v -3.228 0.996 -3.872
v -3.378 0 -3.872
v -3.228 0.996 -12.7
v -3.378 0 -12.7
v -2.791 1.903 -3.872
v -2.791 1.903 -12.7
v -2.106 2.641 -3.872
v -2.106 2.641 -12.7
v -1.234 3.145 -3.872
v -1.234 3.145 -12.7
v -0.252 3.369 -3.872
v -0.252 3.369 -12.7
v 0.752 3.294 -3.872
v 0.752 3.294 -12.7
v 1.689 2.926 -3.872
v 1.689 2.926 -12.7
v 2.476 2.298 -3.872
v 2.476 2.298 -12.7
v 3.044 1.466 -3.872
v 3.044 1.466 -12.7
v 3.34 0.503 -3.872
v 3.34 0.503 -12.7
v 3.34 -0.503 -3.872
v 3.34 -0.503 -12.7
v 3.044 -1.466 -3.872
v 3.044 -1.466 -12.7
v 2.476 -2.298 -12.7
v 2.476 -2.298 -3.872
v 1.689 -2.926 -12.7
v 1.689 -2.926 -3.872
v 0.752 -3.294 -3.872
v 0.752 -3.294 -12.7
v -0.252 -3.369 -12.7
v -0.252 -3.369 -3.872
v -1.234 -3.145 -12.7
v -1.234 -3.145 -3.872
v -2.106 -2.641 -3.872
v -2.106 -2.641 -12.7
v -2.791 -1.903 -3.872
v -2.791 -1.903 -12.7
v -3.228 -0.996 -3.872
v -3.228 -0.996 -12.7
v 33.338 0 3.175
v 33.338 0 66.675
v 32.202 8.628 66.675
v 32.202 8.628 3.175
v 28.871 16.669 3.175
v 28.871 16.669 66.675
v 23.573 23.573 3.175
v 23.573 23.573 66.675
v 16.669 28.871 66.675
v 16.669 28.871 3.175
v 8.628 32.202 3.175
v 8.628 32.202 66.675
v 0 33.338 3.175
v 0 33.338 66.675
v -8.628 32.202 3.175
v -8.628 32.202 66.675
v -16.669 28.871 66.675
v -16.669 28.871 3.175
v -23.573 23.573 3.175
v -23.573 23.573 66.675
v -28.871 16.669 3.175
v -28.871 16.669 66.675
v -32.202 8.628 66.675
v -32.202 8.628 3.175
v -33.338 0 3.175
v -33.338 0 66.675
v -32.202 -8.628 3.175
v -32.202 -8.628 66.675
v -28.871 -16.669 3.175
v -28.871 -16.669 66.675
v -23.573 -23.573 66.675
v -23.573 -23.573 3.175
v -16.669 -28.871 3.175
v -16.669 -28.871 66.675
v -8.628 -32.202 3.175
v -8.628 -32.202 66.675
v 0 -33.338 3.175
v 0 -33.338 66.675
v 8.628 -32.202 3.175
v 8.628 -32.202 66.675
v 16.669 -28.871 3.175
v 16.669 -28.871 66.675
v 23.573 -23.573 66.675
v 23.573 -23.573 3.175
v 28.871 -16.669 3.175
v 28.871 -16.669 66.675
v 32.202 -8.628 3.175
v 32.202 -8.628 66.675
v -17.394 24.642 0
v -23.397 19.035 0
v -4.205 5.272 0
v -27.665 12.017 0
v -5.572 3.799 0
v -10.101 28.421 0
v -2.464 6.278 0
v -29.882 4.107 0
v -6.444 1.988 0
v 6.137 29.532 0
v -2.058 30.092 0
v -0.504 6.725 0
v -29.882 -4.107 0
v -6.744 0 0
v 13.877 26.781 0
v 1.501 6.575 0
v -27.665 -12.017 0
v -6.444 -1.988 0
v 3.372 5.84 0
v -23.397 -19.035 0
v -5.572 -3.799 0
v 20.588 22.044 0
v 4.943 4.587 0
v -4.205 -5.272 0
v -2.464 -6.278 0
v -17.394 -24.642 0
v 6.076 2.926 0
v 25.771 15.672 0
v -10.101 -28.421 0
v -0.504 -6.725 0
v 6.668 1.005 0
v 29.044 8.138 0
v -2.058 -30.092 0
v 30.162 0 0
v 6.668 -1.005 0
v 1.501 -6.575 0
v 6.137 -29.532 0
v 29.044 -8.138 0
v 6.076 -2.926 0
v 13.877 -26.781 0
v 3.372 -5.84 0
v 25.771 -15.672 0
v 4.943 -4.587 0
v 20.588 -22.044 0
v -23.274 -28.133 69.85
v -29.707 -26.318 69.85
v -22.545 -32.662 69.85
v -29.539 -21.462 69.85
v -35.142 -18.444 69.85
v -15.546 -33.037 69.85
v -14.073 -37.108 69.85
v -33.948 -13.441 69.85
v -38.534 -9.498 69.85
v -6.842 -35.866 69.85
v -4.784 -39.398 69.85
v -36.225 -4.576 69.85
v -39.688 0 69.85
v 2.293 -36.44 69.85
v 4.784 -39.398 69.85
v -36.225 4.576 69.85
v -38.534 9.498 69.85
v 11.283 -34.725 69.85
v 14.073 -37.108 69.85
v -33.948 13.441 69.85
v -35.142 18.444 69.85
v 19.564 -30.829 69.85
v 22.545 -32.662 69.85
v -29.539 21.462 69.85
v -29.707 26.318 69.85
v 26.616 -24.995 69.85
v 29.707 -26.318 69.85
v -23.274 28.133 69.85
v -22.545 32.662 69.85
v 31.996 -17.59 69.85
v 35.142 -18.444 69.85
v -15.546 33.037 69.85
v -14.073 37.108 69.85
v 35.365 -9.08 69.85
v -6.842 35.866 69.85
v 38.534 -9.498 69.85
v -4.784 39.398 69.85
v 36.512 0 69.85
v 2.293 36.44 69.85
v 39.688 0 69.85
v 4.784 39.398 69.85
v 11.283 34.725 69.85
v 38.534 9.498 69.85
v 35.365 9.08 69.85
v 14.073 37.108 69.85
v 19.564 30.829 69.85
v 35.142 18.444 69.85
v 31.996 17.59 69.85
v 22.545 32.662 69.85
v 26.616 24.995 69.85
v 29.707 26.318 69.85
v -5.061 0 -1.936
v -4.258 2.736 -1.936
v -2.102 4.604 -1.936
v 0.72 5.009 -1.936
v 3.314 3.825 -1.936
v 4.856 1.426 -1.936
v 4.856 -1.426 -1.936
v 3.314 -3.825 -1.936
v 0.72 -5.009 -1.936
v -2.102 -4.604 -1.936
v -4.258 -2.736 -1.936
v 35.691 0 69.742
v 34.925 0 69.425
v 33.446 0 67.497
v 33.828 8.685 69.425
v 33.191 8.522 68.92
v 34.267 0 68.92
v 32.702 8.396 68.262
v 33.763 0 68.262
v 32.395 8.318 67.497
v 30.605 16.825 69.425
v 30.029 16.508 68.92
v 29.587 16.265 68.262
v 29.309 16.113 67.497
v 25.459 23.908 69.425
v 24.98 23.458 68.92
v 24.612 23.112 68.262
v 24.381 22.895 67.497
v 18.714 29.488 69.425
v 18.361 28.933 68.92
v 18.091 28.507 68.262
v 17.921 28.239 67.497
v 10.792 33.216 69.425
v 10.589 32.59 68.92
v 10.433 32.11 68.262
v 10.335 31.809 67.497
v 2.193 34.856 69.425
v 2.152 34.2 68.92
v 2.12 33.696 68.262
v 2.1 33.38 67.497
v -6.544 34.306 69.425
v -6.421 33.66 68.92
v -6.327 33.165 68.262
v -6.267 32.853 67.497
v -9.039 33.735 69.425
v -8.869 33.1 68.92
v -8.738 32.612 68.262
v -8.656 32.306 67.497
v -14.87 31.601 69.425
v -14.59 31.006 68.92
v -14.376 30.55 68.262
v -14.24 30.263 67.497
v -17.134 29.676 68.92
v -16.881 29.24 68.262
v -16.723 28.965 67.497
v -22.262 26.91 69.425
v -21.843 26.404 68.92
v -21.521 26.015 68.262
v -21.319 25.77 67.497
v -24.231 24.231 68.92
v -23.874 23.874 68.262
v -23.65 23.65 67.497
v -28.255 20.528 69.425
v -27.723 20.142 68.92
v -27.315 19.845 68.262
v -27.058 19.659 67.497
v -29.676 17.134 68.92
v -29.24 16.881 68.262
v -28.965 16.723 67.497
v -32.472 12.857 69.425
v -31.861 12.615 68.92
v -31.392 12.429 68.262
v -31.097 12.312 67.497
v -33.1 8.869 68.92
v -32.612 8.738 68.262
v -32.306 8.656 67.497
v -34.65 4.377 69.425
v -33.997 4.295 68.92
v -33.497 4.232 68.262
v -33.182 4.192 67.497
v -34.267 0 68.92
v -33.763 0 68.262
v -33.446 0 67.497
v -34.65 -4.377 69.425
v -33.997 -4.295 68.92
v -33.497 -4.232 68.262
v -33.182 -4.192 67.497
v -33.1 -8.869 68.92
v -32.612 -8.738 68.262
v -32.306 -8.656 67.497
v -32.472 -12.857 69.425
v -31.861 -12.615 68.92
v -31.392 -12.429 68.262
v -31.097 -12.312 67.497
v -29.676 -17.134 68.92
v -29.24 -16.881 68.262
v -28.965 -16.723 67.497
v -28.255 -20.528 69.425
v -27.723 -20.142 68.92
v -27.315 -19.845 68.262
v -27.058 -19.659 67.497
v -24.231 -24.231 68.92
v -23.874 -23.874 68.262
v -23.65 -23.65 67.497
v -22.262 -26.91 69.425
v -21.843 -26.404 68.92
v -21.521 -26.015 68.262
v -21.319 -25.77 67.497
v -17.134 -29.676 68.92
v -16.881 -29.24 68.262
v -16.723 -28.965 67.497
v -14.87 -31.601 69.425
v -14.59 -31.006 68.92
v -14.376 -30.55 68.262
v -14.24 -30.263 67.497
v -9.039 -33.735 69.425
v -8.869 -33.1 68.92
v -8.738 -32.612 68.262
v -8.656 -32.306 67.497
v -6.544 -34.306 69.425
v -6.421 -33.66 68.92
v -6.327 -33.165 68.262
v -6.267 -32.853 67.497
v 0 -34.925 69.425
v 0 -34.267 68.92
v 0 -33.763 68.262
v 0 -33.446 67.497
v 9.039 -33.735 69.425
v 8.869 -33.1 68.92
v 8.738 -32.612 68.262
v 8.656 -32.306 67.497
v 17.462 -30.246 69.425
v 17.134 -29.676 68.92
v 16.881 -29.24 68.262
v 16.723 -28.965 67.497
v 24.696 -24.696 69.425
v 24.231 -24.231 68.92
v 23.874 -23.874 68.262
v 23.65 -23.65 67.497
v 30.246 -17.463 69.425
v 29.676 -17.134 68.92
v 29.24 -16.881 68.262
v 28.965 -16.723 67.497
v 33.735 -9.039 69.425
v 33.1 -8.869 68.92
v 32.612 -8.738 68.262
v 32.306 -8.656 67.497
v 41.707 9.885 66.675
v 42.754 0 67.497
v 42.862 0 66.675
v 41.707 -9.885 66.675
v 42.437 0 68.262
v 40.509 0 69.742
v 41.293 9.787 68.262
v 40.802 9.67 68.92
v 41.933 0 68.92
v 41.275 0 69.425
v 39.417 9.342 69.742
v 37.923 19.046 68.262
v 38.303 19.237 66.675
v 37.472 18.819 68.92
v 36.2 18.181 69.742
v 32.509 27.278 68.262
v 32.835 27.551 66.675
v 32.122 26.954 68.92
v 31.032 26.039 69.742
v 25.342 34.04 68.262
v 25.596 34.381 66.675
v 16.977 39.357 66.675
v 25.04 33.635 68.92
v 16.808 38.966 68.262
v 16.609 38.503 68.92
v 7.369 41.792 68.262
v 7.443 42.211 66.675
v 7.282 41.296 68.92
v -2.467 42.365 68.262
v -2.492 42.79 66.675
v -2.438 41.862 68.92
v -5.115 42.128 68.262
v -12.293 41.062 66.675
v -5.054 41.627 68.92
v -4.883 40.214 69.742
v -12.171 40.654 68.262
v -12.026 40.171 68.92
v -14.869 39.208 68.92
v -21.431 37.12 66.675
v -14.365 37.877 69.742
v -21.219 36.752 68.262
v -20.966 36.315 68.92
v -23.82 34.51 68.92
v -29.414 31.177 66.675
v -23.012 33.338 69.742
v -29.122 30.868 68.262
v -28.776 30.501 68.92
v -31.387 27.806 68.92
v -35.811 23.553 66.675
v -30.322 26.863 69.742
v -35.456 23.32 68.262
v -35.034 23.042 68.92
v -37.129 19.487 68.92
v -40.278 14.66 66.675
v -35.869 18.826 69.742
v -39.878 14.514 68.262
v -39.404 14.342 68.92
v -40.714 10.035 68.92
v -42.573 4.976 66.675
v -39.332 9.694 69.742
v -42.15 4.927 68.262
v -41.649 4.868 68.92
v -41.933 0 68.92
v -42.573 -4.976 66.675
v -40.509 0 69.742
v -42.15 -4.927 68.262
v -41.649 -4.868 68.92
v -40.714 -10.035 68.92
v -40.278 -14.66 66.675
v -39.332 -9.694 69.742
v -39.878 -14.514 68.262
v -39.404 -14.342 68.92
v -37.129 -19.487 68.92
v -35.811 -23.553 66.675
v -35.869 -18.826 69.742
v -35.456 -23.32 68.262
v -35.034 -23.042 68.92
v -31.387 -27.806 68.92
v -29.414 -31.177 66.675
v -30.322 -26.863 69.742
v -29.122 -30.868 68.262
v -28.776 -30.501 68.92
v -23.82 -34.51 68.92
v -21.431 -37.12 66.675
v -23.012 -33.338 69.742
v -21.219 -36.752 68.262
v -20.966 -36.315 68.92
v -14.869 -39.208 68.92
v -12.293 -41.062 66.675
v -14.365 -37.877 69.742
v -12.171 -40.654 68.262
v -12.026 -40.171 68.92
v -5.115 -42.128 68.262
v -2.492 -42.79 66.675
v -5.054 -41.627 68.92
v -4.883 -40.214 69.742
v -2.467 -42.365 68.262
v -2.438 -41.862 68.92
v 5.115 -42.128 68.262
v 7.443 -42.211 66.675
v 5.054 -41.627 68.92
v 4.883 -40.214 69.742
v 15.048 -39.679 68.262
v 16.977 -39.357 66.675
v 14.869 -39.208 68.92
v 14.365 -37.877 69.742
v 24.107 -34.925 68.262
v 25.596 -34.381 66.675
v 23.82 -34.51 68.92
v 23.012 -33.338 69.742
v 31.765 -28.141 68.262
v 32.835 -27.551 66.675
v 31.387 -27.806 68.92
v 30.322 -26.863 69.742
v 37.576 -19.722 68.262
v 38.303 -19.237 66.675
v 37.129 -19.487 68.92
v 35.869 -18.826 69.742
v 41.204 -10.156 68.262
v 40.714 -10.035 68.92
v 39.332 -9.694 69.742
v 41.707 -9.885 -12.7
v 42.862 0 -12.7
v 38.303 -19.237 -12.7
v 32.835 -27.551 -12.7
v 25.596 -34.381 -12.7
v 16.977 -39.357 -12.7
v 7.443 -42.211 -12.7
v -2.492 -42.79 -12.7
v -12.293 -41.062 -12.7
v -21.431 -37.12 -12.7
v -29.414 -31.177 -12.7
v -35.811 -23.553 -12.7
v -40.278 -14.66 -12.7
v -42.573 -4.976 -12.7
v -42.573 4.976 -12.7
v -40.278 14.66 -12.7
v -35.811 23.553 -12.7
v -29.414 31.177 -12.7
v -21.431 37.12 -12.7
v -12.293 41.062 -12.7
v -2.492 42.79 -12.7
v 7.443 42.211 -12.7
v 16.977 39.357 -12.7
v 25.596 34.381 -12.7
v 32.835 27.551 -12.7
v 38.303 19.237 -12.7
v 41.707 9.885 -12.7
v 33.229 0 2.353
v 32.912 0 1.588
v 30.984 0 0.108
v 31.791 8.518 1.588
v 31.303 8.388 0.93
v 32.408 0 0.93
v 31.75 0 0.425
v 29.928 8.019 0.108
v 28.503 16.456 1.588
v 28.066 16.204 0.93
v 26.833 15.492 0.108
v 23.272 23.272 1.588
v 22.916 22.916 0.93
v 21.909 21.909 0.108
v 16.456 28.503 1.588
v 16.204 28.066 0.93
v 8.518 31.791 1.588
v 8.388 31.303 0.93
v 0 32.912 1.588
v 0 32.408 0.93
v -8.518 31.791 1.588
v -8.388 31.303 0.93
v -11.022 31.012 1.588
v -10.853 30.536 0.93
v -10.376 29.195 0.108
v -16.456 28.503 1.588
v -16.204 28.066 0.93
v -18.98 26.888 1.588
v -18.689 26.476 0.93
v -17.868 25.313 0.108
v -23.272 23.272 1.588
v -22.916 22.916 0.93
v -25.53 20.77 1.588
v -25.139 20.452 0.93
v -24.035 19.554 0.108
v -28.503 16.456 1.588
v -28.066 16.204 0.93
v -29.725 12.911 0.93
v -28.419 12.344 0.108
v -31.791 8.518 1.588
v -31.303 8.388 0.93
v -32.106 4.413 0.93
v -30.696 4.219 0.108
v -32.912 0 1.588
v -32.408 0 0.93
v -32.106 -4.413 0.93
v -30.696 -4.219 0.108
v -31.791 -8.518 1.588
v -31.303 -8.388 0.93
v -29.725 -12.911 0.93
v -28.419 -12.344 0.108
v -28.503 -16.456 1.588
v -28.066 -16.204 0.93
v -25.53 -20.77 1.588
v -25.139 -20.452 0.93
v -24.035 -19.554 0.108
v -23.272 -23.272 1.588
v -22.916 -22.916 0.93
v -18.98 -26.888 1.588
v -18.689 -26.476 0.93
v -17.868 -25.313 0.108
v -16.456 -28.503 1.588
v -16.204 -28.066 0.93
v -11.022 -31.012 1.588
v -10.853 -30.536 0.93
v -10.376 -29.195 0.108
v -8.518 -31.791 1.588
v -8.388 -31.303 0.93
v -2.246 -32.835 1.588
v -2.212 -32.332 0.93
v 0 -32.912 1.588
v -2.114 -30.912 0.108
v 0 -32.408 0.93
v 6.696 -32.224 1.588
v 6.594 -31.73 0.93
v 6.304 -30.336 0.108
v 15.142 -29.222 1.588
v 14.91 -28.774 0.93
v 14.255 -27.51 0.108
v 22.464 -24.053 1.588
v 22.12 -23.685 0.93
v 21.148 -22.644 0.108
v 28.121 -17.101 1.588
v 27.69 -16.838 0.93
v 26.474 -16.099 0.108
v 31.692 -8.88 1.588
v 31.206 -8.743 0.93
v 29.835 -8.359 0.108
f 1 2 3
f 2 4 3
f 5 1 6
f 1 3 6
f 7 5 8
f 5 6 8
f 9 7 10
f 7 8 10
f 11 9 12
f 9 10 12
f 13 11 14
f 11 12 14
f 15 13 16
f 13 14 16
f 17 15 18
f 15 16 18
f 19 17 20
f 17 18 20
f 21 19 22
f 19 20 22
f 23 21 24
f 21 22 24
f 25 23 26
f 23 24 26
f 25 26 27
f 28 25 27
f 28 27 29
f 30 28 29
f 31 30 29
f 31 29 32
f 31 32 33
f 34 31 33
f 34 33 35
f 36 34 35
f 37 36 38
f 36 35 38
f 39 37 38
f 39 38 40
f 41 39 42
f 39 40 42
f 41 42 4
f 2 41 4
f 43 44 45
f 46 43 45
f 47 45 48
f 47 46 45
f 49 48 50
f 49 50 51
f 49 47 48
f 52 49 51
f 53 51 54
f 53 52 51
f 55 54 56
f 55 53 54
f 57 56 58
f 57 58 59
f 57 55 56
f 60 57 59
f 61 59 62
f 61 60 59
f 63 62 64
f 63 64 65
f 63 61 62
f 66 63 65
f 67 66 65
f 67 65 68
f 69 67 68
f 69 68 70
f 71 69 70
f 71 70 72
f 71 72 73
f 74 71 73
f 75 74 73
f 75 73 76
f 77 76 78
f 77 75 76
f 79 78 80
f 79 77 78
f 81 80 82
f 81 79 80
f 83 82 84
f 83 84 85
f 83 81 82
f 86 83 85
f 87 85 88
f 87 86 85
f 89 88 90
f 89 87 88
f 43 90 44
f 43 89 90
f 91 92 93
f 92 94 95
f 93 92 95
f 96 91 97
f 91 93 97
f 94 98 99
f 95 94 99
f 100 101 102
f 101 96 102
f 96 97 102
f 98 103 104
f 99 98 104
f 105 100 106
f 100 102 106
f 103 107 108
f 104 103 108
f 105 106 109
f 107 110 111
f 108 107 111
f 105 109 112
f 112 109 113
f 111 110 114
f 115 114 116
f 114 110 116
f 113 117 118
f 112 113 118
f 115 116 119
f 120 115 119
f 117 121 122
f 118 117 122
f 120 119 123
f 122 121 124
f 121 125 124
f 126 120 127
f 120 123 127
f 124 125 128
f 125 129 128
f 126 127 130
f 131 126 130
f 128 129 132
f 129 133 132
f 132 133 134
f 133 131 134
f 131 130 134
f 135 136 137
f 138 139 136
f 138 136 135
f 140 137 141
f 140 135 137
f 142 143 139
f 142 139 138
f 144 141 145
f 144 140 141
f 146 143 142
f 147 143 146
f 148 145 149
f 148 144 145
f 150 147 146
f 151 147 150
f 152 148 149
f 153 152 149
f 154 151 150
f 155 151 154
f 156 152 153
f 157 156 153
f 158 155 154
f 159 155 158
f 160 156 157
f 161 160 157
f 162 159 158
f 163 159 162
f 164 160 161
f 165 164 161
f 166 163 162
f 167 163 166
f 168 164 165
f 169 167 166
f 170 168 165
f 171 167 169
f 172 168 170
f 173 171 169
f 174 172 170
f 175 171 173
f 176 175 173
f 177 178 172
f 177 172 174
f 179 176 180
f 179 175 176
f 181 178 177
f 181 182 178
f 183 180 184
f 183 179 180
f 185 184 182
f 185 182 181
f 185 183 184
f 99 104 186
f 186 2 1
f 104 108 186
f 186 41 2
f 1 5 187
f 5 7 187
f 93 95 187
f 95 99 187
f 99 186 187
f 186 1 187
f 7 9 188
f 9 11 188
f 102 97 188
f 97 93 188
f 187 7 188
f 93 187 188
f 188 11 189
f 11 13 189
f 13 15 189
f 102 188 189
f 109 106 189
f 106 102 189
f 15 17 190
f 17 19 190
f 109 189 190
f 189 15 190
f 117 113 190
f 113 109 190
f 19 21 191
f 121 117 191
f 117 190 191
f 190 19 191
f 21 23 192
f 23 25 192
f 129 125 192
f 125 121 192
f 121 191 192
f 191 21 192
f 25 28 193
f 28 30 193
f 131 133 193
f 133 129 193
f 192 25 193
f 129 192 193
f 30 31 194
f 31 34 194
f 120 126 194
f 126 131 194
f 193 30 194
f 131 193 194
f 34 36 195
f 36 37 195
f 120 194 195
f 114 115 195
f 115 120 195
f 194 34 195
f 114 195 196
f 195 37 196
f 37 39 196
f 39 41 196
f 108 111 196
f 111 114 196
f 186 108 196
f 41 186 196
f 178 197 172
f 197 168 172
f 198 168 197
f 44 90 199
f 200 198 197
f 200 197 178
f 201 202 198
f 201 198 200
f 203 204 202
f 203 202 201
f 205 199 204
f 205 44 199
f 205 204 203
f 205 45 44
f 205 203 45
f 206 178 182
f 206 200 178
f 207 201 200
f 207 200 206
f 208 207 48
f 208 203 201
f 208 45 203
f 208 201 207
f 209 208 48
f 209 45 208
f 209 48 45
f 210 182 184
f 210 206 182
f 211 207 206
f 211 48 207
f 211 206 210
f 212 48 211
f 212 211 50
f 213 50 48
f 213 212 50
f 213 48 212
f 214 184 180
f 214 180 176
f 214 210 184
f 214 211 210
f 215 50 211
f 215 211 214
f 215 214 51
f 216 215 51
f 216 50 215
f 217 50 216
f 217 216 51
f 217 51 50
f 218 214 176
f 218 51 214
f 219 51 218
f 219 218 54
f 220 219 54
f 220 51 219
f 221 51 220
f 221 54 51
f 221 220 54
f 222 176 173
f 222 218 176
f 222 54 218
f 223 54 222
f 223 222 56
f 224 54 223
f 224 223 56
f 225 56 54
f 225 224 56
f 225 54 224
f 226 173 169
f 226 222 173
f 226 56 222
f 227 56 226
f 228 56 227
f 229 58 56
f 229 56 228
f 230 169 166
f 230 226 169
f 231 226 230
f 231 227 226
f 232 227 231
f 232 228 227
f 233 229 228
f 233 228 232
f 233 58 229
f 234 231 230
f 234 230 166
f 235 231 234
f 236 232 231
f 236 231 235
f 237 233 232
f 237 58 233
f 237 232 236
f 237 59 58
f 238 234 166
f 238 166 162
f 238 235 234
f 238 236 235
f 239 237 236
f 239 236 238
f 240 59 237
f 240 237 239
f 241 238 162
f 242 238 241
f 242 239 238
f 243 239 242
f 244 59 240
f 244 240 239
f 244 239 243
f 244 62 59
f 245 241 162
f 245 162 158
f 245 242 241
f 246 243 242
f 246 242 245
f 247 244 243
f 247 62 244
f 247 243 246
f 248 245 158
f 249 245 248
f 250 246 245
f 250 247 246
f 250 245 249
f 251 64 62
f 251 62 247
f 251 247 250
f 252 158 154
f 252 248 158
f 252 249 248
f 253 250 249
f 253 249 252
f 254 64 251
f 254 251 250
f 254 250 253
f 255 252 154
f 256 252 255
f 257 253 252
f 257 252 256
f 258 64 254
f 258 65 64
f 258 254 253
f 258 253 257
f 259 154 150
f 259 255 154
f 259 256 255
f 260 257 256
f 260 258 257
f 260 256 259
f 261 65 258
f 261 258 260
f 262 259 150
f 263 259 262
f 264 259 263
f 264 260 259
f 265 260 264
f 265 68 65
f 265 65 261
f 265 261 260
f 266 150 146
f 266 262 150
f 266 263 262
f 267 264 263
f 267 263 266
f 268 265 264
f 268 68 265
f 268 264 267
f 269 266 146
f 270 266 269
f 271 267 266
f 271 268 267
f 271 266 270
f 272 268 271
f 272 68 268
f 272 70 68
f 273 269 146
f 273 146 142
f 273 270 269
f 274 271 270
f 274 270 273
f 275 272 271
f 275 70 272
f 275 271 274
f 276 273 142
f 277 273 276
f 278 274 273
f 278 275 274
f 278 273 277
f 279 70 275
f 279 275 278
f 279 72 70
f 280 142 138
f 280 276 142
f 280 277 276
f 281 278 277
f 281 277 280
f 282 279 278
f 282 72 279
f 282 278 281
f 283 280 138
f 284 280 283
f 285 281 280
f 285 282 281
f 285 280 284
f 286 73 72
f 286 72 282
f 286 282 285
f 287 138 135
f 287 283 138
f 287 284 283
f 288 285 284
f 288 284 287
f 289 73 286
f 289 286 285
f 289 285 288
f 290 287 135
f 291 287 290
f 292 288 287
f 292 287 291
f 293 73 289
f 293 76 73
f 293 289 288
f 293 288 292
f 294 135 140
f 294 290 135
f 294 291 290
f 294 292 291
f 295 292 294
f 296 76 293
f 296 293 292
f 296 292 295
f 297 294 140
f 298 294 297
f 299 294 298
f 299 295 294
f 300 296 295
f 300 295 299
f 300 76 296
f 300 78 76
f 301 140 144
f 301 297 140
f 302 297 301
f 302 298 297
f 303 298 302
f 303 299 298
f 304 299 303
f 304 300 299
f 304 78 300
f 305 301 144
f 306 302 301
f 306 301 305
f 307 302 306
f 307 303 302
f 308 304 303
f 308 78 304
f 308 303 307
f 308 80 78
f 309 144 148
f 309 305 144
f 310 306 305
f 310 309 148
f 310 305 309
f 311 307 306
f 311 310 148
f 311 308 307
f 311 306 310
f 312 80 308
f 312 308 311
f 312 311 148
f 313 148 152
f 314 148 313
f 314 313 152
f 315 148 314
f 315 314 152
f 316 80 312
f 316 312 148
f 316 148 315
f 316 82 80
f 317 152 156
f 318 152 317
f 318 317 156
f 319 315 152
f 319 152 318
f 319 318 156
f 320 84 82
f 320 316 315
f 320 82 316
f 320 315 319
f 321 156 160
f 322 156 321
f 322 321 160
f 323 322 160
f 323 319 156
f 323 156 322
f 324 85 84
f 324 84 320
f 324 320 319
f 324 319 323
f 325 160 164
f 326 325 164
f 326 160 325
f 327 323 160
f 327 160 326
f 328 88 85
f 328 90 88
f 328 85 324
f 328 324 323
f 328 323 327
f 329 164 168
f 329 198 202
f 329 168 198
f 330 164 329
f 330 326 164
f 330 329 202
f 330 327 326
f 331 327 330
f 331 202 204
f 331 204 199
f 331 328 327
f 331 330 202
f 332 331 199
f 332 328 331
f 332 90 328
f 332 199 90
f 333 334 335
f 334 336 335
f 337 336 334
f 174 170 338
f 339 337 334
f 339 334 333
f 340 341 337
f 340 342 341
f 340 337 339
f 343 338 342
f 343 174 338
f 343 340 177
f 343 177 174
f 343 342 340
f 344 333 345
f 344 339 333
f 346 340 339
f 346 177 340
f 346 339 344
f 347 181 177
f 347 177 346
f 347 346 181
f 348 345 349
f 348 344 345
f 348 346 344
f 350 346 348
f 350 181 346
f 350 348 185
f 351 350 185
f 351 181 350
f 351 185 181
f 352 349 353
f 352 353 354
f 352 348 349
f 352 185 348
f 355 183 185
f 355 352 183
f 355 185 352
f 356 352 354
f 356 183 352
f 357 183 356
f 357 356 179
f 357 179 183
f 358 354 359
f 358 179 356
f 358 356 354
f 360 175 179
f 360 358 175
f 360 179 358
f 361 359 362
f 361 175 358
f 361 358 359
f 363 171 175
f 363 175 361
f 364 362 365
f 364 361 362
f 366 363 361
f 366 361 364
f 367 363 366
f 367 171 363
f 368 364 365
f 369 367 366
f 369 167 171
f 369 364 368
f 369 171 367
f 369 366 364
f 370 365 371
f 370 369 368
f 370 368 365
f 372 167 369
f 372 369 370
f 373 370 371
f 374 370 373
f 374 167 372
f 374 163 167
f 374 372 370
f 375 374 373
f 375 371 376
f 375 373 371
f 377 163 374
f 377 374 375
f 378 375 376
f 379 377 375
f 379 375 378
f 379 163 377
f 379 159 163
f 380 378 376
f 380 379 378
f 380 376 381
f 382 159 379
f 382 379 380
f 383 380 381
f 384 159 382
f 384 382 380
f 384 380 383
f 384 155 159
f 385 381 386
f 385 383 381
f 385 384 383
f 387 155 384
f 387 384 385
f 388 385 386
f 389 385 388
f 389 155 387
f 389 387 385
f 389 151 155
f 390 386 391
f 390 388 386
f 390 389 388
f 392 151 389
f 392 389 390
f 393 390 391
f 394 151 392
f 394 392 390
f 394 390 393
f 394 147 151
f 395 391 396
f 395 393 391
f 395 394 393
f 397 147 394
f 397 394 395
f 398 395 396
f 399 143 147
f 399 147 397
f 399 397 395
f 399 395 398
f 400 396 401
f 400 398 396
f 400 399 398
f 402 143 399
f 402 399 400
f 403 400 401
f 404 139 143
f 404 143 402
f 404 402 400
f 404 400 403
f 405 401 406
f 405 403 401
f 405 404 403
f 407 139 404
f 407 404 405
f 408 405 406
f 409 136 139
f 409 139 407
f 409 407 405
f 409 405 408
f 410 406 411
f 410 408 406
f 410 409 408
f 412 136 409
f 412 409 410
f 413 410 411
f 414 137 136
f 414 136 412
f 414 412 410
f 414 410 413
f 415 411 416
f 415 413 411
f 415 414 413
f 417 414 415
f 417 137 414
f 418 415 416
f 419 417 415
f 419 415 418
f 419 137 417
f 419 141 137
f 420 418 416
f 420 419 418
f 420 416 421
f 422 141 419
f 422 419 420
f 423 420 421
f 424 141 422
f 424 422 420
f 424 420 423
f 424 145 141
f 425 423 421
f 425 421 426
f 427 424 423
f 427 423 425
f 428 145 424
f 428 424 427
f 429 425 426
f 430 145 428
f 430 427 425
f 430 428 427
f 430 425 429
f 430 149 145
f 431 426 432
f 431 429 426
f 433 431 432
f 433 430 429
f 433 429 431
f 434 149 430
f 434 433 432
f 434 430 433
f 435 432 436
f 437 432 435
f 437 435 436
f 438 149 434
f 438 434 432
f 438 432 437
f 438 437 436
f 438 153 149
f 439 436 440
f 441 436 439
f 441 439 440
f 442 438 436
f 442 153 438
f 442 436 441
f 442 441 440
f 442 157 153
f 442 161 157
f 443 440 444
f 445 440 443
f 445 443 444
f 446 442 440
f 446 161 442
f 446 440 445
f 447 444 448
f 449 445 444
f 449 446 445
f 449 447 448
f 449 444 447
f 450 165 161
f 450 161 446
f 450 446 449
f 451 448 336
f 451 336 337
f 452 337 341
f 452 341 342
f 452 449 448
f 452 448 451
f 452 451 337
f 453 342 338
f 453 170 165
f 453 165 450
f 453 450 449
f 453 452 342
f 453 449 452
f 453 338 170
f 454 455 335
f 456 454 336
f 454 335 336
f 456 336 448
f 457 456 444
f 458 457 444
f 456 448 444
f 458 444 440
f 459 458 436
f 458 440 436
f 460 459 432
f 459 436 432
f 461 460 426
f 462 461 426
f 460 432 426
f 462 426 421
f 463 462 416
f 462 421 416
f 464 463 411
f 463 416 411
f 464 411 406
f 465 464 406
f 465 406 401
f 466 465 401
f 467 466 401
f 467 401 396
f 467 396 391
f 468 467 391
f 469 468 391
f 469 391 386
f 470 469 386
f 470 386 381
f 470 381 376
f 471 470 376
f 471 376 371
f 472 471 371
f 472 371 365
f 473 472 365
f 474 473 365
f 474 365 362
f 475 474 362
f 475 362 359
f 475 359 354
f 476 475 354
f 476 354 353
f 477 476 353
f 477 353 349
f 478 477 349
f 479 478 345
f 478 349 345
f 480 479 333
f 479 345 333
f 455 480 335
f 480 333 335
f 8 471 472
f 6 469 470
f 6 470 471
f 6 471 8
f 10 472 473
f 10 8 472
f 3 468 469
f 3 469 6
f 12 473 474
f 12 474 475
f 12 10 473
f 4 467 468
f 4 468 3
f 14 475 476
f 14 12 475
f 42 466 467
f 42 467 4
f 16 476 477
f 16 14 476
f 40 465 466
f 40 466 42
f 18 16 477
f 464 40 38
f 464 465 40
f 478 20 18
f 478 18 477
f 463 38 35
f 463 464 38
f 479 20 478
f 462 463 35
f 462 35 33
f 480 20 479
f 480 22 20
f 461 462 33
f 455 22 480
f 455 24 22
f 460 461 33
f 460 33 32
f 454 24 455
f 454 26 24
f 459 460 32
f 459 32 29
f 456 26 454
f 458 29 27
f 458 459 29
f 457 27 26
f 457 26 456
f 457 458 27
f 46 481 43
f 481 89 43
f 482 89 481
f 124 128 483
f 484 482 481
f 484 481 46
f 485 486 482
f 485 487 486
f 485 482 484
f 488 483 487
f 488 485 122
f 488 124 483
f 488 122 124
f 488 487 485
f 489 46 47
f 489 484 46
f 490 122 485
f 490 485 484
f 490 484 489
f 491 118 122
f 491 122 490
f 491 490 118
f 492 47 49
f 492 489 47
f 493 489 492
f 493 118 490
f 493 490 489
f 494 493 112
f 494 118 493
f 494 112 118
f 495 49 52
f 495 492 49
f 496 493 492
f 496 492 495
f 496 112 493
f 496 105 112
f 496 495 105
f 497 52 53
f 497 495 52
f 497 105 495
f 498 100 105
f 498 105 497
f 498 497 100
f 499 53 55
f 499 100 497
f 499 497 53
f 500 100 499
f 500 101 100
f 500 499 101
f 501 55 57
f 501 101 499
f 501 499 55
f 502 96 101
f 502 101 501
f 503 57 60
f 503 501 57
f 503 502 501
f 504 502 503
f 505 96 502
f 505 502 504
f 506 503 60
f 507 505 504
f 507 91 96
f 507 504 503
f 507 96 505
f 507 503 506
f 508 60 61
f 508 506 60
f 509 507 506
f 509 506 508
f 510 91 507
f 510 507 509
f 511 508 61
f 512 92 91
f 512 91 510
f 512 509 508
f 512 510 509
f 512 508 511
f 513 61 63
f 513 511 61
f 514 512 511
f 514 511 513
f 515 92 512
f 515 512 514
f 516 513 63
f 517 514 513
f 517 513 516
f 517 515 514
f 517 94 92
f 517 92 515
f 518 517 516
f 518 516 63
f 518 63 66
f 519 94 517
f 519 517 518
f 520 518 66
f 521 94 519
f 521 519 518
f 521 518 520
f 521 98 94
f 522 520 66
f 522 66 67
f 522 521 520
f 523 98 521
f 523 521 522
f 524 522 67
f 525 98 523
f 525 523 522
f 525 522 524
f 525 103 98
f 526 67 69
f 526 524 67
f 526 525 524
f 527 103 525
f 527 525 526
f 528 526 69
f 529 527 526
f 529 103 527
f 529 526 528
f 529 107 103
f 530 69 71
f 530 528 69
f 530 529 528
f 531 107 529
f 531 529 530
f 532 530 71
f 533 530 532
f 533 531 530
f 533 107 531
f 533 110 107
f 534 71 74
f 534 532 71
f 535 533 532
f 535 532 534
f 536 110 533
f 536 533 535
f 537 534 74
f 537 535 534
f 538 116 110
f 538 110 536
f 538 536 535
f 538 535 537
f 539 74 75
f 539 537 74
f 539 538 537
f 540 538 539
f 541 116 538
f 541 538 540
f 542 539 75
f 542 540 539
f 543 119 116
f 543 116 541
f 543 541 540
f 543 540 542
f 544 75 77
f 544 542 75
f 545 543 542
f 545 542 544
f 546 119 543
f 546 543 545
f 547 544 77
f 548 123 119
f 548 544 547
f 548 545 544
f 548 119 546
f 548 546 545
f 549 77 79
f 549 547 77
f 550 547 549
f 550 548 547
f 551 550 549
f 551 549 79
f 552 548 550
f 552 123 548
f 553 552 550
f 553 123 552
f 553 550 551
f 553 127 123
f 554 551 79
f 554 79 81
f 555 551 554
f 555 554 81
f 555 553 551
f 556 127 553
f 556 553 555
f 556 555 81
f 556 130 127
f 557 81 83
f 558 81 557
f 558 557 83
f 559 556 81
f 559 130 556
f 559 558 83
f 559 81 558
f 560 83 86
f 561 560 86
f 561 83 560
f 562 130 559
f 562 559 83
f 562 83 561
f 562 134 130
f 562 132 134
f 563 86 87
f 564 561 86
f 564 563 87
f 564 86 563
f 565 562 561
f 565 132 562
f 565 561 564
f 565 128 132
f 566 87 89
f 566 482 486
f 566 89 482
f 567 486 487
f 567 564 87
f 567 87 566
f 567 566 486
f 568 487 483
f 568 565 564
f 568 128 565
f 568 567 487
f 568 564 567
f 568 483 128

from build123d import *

# Parameters (mm, degrees)
F0_R           = 42.8625
F0_R_2         = 33.3375
F1_DEPTH       = 69.85
F2_R           = 42.8625
F3_DEPTH       = 12.7
F5_D           = 6.7564
F5_CSINK_D     = 13.4874
F5_CSINK_ANGLE = 82
F6_R           = 3.175


with BuildPart() as f1:
    # F0 (on Top) → F1 (new body)
    with BuildSketch(Plane.XY):
        Circle(F0_R)
        Circle(F0_R_2, mode=Mode.SUBTRACT)
    extrude(amount=F1_DEPTH)

    # F2 (on face) → F3 (join)
    with BuildSketch(Plane(origin=(0, 0, 0), x_dir=(1, 0, 0), z_dir=(0, 0, -1))):
        Circle(F2_R)
    extrude(amount=F3_DEPTH)

    # F5 (through all)
    with Locations(Plane.XY):
        with Locations((0, 0)):
            CounterSinkHole(F5_D / 2, F5_CSINK_D / 2, counter_sink_angle=F5_CSINK_ANGLE)

    # F6
    f6_edges = [f1.edges().sort_by_distance(p)[0] for p in [
        (-33.3375, 0, 0),
        (-33.3375, 0, 69.85),
        (-42.8625, 0, 69.85),
    ]]
    fillet(f6_edges, radius=F6_R)


solid = f1.part
